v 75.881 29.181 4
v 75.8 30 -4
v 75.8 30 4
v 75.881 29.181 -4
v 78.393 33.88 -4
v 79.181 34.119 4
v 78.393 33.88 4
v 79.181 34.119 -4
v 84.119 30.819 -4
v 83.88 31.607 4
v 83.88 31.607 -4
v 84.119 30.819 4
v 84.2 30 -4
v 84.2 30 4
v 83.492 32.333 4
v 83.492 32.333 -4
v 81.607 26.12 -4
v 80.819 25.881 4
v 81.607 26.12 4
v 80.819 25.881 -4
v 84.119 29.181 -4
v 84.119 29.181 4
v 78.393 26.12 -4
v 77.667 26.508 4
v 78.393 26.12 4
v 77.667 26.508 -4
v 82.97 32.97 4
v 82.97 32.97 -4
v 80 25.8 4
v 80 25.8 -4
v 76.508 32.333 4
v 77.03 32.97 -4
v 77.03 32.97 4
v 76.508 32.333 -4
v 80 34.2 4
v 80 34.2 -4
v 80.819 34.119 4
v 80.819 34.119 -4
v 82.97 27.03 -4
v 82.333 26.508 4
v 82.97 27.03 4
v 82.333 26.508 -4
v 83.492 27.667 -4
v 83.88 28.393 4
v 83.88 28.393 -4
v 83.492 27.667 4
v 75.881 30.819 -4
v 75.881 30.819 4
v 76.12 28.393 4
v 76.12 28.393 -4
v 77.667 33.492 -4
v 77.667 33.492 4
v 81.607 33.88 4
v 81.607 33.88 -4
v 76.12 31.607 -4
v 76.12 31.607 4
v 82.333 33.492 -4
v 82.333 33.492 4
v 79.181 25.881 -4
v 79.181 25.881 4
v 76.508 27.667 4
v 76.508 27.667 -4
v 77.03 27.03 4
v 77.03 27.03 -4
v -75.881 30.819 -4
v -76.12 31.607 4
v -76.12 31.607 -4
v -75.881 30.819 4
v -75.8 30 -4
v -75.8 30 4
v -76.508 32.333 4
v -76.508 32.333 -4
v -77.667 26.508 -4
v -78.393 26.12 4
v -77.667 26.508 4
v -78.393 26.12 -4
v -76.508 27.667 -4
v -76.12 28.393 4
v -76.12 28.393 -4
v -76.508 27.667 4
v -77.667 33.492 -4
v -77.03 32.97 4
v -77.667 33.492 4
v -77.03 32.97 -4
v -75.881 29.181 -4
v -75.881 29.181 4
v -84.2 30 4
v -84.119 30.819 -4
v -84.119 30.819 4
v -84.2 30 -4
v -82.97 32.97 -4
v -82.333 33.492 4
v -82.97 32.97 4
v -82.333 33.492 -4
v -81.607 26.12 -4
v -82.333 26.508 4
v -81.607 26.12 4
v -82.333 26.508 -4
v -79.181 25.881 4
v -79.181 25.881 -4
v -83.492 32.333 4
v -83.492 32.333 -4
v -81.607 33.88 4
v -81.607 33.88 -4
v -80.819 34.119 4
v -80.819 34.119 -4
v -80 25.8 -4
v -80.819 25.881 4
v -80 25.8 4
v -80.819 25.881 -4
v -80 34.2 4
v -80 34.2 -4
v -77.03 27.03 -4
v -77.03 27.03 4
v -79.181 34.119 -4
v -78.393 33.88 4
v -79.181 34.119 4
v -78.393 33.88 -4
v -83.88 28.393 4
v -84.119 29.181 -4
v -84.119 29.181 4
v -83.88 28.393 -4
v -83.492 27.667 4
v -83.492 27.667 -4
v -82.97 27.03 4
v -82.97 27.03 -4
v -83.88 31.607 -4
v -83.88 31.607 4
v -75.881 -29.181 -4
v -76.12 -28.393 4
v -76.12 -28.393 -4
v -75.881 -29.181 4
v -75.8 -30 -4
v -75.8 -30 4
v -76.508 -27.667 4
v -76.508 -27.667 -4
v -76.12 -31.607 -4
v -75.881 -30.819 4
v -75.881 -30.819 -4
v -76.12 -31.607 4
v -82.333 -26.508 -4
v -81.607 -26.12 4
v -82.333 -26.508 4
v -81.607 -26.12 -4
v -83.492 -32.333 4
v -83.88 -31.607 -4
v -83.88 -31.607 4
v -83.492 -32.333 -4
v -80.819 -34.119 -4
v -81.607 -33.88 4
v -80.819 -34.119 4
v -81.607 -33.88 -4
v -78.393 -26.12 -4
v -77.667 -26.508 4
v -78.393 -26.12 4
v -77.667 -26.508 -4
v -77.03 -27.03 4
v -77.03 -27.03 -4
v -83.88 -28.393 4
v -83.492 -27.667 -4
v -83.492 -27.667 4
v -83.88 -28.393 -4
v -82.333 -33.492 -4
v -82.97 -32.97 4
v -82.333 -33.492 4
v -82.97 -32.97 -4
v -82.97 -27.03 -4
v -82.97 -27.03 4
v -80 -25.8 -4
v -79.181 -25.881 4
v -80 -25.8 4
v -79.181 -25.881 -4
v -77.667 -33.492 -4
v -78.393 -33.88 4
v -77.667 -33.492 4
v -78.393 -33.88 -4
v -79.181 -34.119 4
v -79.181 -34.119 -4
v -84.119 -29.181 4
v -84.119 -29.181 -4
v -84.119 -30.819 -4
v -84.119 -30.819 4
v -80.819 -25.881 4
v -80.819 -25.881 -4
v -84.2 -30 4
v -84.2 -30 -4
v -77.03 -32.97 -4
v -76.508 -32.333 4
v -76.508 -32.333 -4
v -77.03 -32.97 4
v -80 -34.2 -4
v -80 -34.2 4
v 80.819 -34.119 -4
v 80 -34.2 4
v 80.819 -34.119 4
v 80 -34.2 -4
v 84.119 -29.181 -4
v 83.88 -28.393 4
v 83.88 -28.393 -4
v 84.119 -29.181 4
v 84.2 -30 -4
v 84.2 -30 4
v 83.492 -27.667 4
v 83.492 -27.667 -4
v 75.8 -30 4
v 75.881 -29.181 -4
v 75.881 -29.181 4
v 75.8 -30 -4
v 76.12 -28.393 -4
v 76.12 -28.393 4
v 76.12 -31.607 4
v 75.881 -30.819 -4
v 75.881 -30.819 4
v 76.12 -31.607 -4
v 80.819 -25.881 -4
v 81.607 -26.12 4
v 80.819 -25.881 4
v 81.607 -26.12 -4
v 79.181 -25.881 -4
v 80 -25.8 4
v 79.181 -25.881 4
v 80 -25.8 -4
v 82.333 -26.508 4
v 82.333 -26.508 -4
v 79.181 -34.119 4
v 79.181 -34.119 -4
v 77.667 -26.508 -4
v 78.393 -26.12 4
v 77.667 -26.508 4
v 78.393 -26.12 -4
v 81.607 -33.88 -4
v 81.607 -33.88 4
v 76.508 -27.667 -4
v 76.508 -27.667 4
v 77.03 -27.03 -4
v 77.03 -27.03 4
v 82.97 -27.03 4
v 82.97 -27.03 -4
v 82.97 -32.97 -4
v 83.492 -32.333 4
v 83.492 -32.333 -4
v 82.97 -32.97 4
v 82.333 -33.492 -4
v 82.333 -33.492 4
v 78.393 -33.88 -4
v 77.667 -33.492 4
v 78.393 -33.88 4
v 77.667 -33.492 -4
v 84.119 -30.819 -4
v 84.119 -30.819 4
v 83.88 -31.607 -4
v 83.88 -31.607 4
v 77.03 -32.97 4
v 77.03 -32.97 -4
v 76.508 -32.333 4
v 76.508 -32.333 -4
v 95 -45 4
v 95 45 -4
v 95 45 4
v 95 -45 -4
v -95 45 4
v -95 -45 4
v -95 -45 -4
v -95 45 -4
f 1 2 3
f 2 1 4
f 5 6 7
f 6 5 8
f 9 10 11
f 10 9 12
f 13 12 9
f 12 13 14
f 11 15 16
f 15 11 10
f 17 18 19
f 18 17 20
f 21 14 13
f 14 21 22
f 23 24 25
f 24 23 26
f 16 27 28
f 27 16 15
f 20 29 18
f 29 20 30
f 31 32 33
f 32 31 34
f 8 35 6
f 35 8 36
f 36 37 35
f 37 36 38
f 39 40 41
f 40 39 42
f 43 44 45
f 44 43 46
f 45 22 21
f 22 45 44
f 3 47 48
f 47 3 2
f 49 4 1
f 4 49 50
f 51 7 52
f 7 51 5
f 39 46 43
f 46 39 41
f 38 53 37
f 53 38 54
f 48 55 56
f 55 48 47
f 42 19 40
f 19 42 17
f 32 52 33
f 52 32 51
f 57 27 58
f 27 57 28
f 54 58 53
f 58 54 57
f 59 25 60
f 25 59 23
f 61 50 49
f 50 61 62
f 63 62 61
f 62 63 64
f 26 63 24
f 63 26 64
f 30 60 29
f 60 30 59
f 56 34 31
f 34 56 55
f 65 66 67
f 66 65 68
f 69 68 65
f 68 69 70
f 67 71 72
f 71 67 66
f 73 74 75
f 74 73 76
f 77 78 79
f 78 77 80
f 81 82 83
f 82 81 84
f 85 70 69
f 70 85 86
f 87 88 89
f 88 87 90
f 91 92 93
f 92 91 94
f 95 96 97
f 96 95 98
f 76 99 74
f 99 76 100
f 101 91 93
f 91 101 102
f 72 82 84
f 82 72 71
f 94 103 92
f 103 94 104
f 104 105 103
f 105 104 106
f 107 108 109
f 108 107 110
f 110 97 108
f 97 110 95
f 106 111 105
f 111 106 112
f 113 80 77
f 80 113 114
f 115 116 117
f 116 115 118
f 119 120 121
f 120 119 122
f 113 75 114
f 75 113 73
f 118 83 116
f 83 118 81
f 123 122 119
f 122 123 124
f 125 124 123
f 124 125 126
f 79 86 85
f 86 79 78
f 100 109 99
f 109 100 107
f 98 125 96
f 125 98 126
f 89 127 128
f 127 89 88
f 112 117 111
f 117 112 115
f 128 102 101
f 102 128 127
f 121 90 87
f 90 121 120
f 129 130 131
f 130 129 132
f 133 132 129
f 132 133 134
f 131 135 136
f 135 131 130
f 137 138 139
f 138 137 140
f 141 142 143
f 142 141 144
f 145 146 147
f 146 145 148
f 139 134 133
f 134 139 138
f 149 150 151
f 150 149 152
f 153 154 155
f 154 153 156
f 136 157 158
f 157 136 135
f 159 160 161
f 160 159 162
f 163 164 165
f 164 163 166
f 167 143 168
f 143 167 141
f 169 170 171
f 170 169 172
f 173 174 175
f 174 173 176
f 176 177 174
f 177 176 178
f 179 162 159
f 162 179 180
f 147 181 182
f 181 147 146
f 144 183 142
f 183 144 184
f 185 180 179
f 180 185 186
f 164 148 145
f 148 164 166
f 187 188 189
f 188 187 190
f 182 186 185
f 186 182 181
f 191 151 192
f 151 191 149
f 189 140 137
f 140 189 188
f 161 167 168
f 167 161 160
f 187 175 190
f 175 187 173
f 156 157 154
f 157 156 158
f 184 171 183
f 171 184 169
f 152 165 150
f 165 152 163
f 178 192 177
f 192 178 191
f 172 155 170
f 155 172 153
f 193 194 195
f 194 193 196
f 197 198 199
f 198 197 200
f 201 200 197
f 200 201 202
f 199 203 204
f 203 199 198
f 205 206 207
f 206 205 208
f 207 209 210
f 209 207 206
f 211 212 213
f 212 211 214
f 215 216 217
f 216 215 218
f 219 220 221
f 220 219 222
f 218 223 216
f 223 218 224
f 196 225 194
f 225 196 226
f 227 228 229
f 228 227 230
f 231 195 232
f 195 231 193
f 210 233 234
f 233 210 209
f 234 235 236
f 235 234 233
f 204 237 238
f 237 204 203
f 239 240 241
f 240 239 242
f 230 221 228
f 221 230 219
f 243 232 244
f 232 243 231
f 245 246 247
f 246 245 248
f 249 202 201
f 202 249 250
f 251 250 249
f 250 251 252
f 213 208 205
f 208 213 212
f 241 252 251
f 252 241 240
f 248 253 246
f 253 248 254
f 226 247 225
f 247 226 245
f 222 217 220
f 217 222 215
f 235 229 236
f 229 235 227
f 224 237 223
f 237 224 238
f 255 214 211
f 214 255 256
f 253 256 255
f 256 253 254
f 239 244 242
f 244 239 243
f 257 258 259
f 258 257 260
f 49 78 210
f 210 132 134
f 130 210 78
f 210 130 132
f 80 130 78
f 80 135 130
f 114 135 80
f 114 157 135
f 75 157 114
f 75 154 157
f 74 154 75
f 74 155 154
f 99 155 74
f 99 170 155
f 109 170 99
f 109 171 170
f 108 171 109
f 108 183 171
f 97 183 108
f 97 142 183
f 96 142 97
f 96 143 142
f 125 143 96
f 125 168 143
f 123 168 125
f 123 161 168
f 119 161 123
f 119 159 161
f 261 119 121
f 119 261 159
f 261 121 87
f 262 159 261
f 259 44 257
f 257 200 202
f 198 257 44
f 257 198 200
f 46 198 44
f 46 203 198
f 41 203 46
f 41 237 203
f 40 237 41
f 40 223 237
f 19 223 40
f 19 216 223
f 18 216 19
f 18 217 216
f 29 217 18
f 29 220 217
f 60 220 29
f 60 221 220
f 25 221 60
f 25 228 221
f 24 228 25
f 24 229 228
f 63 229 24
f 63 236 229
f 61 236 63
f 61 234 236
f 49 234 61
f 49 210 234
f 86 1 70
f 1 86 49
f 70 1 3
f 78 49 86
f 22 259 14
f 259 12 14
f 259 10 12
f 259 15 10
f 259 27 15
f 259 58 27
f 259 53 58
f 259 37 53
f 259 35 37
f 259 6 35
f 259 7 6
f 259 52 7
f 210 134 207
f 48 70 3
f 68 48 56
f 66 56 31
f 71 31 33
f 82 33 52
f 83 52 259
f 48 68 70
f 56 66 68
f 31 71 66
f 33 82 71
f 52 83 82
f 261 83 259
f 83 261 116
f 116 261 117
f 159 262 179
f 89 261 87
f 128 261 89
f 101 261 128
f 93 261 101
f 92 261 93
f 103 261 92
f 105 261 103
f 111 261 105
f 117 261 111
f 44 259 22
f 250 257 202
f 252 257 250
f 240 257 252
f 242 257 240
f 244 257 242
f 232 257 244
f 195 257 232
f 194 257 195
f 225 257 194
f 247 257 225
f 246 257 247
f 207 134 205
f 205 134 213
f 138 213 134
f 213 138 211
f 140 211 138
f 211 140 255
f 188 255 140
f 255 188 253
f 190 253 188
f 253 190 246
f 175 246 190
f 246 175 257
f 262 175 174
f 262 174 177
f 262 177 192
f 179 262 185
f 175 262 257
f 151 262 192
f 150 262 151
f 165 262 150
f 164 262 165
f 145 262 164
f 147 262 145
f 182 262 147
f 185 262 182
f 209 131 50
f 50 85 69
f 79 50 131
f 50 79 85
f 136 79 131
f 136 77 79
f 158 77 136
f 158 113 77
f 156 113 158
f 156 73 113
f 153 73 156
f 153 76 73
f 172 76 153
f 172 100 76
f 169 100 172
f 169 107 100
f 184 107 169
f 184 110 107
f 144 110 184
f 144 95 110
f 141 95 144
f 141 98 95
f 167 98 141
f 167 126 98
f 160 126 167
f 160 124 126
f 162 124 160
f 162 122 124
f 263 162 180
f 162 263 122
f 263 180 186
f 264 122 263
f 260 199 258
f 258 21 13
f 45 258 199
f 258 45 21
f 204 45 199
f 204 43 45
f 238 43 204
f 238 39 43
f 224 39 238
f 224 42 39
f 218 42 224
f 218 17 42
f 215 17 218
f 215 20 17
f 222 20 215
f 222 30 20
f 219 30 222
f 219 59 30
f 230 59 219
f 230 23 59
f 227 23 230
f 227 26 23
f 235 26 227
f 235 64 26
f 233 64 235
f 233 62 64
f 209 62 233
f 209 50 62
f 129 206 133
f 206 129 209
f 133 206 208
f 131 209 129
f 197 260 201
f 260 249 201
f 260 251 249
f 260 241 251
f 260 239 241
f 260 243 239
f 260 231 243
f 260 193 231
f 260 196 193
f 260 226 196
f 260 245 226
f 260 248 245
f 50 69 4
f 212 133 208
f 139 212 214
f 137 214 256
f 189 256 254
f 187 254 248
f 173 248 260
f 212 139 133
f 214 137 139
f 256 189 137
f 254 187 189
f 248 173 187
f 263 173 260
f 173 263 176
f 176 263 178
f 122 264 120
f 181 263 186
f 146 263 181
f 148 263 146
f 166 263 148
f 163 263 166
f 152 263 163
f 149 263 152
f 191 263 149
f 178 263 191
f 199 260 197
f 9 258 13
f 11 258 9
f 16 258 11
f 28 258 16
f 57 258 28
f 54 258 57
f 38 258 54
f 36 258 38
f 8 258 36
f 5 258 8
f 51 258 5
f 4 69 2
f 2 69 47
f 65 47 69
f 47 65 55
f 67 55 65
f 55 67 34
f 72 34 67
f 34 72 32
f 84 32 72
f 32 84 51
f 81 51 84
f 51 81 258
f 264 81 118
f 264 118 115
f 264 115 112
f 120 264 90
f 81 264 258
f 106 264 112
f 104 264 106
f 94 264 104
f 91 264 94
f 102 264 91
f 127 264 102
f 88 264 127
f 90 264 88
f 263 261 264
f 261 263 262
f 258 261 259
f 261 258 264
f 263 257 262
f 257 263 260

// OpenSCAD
$fn = 32;

// ----------------------------------------------------------------------
// Corner plate 190 x 90 x 8
// 4 holes, centres taken from the edge offset
// ----------------------------------------------------------------------

// --- parameters (mm) ---
plate = [190, 90, 8];  // overall size (x, y, z)
holes = 4;             // number of holes the drawing asks for
hole_d = 8.4;          // hole diameter
edge = 15;             // hole centre offset from the plate edge

// --- derived feature positions (mm) ---
corner_x = plate[0] / 2 - edge;  // = 80   corner hole X
corner_y = plate[1] / 2 - edge;  // = 30   corner hole Y
feature_centers = [
  [corner_x, corner_y],
  [-corner_x, corner_y],
  [-corner_x, -corner_y],
  [corner_x, -corner_y]
];   // hole centres the loop below drills

// plate outline, every hole drilled through with the same cutters
difference() {
  cube(plate, center = true);
  for (centre = feature_centers)
    translate([centre[0], centre[1], 0])
      cylinder(d = hole_d, h = plate[2] + 2, center = true);
}
